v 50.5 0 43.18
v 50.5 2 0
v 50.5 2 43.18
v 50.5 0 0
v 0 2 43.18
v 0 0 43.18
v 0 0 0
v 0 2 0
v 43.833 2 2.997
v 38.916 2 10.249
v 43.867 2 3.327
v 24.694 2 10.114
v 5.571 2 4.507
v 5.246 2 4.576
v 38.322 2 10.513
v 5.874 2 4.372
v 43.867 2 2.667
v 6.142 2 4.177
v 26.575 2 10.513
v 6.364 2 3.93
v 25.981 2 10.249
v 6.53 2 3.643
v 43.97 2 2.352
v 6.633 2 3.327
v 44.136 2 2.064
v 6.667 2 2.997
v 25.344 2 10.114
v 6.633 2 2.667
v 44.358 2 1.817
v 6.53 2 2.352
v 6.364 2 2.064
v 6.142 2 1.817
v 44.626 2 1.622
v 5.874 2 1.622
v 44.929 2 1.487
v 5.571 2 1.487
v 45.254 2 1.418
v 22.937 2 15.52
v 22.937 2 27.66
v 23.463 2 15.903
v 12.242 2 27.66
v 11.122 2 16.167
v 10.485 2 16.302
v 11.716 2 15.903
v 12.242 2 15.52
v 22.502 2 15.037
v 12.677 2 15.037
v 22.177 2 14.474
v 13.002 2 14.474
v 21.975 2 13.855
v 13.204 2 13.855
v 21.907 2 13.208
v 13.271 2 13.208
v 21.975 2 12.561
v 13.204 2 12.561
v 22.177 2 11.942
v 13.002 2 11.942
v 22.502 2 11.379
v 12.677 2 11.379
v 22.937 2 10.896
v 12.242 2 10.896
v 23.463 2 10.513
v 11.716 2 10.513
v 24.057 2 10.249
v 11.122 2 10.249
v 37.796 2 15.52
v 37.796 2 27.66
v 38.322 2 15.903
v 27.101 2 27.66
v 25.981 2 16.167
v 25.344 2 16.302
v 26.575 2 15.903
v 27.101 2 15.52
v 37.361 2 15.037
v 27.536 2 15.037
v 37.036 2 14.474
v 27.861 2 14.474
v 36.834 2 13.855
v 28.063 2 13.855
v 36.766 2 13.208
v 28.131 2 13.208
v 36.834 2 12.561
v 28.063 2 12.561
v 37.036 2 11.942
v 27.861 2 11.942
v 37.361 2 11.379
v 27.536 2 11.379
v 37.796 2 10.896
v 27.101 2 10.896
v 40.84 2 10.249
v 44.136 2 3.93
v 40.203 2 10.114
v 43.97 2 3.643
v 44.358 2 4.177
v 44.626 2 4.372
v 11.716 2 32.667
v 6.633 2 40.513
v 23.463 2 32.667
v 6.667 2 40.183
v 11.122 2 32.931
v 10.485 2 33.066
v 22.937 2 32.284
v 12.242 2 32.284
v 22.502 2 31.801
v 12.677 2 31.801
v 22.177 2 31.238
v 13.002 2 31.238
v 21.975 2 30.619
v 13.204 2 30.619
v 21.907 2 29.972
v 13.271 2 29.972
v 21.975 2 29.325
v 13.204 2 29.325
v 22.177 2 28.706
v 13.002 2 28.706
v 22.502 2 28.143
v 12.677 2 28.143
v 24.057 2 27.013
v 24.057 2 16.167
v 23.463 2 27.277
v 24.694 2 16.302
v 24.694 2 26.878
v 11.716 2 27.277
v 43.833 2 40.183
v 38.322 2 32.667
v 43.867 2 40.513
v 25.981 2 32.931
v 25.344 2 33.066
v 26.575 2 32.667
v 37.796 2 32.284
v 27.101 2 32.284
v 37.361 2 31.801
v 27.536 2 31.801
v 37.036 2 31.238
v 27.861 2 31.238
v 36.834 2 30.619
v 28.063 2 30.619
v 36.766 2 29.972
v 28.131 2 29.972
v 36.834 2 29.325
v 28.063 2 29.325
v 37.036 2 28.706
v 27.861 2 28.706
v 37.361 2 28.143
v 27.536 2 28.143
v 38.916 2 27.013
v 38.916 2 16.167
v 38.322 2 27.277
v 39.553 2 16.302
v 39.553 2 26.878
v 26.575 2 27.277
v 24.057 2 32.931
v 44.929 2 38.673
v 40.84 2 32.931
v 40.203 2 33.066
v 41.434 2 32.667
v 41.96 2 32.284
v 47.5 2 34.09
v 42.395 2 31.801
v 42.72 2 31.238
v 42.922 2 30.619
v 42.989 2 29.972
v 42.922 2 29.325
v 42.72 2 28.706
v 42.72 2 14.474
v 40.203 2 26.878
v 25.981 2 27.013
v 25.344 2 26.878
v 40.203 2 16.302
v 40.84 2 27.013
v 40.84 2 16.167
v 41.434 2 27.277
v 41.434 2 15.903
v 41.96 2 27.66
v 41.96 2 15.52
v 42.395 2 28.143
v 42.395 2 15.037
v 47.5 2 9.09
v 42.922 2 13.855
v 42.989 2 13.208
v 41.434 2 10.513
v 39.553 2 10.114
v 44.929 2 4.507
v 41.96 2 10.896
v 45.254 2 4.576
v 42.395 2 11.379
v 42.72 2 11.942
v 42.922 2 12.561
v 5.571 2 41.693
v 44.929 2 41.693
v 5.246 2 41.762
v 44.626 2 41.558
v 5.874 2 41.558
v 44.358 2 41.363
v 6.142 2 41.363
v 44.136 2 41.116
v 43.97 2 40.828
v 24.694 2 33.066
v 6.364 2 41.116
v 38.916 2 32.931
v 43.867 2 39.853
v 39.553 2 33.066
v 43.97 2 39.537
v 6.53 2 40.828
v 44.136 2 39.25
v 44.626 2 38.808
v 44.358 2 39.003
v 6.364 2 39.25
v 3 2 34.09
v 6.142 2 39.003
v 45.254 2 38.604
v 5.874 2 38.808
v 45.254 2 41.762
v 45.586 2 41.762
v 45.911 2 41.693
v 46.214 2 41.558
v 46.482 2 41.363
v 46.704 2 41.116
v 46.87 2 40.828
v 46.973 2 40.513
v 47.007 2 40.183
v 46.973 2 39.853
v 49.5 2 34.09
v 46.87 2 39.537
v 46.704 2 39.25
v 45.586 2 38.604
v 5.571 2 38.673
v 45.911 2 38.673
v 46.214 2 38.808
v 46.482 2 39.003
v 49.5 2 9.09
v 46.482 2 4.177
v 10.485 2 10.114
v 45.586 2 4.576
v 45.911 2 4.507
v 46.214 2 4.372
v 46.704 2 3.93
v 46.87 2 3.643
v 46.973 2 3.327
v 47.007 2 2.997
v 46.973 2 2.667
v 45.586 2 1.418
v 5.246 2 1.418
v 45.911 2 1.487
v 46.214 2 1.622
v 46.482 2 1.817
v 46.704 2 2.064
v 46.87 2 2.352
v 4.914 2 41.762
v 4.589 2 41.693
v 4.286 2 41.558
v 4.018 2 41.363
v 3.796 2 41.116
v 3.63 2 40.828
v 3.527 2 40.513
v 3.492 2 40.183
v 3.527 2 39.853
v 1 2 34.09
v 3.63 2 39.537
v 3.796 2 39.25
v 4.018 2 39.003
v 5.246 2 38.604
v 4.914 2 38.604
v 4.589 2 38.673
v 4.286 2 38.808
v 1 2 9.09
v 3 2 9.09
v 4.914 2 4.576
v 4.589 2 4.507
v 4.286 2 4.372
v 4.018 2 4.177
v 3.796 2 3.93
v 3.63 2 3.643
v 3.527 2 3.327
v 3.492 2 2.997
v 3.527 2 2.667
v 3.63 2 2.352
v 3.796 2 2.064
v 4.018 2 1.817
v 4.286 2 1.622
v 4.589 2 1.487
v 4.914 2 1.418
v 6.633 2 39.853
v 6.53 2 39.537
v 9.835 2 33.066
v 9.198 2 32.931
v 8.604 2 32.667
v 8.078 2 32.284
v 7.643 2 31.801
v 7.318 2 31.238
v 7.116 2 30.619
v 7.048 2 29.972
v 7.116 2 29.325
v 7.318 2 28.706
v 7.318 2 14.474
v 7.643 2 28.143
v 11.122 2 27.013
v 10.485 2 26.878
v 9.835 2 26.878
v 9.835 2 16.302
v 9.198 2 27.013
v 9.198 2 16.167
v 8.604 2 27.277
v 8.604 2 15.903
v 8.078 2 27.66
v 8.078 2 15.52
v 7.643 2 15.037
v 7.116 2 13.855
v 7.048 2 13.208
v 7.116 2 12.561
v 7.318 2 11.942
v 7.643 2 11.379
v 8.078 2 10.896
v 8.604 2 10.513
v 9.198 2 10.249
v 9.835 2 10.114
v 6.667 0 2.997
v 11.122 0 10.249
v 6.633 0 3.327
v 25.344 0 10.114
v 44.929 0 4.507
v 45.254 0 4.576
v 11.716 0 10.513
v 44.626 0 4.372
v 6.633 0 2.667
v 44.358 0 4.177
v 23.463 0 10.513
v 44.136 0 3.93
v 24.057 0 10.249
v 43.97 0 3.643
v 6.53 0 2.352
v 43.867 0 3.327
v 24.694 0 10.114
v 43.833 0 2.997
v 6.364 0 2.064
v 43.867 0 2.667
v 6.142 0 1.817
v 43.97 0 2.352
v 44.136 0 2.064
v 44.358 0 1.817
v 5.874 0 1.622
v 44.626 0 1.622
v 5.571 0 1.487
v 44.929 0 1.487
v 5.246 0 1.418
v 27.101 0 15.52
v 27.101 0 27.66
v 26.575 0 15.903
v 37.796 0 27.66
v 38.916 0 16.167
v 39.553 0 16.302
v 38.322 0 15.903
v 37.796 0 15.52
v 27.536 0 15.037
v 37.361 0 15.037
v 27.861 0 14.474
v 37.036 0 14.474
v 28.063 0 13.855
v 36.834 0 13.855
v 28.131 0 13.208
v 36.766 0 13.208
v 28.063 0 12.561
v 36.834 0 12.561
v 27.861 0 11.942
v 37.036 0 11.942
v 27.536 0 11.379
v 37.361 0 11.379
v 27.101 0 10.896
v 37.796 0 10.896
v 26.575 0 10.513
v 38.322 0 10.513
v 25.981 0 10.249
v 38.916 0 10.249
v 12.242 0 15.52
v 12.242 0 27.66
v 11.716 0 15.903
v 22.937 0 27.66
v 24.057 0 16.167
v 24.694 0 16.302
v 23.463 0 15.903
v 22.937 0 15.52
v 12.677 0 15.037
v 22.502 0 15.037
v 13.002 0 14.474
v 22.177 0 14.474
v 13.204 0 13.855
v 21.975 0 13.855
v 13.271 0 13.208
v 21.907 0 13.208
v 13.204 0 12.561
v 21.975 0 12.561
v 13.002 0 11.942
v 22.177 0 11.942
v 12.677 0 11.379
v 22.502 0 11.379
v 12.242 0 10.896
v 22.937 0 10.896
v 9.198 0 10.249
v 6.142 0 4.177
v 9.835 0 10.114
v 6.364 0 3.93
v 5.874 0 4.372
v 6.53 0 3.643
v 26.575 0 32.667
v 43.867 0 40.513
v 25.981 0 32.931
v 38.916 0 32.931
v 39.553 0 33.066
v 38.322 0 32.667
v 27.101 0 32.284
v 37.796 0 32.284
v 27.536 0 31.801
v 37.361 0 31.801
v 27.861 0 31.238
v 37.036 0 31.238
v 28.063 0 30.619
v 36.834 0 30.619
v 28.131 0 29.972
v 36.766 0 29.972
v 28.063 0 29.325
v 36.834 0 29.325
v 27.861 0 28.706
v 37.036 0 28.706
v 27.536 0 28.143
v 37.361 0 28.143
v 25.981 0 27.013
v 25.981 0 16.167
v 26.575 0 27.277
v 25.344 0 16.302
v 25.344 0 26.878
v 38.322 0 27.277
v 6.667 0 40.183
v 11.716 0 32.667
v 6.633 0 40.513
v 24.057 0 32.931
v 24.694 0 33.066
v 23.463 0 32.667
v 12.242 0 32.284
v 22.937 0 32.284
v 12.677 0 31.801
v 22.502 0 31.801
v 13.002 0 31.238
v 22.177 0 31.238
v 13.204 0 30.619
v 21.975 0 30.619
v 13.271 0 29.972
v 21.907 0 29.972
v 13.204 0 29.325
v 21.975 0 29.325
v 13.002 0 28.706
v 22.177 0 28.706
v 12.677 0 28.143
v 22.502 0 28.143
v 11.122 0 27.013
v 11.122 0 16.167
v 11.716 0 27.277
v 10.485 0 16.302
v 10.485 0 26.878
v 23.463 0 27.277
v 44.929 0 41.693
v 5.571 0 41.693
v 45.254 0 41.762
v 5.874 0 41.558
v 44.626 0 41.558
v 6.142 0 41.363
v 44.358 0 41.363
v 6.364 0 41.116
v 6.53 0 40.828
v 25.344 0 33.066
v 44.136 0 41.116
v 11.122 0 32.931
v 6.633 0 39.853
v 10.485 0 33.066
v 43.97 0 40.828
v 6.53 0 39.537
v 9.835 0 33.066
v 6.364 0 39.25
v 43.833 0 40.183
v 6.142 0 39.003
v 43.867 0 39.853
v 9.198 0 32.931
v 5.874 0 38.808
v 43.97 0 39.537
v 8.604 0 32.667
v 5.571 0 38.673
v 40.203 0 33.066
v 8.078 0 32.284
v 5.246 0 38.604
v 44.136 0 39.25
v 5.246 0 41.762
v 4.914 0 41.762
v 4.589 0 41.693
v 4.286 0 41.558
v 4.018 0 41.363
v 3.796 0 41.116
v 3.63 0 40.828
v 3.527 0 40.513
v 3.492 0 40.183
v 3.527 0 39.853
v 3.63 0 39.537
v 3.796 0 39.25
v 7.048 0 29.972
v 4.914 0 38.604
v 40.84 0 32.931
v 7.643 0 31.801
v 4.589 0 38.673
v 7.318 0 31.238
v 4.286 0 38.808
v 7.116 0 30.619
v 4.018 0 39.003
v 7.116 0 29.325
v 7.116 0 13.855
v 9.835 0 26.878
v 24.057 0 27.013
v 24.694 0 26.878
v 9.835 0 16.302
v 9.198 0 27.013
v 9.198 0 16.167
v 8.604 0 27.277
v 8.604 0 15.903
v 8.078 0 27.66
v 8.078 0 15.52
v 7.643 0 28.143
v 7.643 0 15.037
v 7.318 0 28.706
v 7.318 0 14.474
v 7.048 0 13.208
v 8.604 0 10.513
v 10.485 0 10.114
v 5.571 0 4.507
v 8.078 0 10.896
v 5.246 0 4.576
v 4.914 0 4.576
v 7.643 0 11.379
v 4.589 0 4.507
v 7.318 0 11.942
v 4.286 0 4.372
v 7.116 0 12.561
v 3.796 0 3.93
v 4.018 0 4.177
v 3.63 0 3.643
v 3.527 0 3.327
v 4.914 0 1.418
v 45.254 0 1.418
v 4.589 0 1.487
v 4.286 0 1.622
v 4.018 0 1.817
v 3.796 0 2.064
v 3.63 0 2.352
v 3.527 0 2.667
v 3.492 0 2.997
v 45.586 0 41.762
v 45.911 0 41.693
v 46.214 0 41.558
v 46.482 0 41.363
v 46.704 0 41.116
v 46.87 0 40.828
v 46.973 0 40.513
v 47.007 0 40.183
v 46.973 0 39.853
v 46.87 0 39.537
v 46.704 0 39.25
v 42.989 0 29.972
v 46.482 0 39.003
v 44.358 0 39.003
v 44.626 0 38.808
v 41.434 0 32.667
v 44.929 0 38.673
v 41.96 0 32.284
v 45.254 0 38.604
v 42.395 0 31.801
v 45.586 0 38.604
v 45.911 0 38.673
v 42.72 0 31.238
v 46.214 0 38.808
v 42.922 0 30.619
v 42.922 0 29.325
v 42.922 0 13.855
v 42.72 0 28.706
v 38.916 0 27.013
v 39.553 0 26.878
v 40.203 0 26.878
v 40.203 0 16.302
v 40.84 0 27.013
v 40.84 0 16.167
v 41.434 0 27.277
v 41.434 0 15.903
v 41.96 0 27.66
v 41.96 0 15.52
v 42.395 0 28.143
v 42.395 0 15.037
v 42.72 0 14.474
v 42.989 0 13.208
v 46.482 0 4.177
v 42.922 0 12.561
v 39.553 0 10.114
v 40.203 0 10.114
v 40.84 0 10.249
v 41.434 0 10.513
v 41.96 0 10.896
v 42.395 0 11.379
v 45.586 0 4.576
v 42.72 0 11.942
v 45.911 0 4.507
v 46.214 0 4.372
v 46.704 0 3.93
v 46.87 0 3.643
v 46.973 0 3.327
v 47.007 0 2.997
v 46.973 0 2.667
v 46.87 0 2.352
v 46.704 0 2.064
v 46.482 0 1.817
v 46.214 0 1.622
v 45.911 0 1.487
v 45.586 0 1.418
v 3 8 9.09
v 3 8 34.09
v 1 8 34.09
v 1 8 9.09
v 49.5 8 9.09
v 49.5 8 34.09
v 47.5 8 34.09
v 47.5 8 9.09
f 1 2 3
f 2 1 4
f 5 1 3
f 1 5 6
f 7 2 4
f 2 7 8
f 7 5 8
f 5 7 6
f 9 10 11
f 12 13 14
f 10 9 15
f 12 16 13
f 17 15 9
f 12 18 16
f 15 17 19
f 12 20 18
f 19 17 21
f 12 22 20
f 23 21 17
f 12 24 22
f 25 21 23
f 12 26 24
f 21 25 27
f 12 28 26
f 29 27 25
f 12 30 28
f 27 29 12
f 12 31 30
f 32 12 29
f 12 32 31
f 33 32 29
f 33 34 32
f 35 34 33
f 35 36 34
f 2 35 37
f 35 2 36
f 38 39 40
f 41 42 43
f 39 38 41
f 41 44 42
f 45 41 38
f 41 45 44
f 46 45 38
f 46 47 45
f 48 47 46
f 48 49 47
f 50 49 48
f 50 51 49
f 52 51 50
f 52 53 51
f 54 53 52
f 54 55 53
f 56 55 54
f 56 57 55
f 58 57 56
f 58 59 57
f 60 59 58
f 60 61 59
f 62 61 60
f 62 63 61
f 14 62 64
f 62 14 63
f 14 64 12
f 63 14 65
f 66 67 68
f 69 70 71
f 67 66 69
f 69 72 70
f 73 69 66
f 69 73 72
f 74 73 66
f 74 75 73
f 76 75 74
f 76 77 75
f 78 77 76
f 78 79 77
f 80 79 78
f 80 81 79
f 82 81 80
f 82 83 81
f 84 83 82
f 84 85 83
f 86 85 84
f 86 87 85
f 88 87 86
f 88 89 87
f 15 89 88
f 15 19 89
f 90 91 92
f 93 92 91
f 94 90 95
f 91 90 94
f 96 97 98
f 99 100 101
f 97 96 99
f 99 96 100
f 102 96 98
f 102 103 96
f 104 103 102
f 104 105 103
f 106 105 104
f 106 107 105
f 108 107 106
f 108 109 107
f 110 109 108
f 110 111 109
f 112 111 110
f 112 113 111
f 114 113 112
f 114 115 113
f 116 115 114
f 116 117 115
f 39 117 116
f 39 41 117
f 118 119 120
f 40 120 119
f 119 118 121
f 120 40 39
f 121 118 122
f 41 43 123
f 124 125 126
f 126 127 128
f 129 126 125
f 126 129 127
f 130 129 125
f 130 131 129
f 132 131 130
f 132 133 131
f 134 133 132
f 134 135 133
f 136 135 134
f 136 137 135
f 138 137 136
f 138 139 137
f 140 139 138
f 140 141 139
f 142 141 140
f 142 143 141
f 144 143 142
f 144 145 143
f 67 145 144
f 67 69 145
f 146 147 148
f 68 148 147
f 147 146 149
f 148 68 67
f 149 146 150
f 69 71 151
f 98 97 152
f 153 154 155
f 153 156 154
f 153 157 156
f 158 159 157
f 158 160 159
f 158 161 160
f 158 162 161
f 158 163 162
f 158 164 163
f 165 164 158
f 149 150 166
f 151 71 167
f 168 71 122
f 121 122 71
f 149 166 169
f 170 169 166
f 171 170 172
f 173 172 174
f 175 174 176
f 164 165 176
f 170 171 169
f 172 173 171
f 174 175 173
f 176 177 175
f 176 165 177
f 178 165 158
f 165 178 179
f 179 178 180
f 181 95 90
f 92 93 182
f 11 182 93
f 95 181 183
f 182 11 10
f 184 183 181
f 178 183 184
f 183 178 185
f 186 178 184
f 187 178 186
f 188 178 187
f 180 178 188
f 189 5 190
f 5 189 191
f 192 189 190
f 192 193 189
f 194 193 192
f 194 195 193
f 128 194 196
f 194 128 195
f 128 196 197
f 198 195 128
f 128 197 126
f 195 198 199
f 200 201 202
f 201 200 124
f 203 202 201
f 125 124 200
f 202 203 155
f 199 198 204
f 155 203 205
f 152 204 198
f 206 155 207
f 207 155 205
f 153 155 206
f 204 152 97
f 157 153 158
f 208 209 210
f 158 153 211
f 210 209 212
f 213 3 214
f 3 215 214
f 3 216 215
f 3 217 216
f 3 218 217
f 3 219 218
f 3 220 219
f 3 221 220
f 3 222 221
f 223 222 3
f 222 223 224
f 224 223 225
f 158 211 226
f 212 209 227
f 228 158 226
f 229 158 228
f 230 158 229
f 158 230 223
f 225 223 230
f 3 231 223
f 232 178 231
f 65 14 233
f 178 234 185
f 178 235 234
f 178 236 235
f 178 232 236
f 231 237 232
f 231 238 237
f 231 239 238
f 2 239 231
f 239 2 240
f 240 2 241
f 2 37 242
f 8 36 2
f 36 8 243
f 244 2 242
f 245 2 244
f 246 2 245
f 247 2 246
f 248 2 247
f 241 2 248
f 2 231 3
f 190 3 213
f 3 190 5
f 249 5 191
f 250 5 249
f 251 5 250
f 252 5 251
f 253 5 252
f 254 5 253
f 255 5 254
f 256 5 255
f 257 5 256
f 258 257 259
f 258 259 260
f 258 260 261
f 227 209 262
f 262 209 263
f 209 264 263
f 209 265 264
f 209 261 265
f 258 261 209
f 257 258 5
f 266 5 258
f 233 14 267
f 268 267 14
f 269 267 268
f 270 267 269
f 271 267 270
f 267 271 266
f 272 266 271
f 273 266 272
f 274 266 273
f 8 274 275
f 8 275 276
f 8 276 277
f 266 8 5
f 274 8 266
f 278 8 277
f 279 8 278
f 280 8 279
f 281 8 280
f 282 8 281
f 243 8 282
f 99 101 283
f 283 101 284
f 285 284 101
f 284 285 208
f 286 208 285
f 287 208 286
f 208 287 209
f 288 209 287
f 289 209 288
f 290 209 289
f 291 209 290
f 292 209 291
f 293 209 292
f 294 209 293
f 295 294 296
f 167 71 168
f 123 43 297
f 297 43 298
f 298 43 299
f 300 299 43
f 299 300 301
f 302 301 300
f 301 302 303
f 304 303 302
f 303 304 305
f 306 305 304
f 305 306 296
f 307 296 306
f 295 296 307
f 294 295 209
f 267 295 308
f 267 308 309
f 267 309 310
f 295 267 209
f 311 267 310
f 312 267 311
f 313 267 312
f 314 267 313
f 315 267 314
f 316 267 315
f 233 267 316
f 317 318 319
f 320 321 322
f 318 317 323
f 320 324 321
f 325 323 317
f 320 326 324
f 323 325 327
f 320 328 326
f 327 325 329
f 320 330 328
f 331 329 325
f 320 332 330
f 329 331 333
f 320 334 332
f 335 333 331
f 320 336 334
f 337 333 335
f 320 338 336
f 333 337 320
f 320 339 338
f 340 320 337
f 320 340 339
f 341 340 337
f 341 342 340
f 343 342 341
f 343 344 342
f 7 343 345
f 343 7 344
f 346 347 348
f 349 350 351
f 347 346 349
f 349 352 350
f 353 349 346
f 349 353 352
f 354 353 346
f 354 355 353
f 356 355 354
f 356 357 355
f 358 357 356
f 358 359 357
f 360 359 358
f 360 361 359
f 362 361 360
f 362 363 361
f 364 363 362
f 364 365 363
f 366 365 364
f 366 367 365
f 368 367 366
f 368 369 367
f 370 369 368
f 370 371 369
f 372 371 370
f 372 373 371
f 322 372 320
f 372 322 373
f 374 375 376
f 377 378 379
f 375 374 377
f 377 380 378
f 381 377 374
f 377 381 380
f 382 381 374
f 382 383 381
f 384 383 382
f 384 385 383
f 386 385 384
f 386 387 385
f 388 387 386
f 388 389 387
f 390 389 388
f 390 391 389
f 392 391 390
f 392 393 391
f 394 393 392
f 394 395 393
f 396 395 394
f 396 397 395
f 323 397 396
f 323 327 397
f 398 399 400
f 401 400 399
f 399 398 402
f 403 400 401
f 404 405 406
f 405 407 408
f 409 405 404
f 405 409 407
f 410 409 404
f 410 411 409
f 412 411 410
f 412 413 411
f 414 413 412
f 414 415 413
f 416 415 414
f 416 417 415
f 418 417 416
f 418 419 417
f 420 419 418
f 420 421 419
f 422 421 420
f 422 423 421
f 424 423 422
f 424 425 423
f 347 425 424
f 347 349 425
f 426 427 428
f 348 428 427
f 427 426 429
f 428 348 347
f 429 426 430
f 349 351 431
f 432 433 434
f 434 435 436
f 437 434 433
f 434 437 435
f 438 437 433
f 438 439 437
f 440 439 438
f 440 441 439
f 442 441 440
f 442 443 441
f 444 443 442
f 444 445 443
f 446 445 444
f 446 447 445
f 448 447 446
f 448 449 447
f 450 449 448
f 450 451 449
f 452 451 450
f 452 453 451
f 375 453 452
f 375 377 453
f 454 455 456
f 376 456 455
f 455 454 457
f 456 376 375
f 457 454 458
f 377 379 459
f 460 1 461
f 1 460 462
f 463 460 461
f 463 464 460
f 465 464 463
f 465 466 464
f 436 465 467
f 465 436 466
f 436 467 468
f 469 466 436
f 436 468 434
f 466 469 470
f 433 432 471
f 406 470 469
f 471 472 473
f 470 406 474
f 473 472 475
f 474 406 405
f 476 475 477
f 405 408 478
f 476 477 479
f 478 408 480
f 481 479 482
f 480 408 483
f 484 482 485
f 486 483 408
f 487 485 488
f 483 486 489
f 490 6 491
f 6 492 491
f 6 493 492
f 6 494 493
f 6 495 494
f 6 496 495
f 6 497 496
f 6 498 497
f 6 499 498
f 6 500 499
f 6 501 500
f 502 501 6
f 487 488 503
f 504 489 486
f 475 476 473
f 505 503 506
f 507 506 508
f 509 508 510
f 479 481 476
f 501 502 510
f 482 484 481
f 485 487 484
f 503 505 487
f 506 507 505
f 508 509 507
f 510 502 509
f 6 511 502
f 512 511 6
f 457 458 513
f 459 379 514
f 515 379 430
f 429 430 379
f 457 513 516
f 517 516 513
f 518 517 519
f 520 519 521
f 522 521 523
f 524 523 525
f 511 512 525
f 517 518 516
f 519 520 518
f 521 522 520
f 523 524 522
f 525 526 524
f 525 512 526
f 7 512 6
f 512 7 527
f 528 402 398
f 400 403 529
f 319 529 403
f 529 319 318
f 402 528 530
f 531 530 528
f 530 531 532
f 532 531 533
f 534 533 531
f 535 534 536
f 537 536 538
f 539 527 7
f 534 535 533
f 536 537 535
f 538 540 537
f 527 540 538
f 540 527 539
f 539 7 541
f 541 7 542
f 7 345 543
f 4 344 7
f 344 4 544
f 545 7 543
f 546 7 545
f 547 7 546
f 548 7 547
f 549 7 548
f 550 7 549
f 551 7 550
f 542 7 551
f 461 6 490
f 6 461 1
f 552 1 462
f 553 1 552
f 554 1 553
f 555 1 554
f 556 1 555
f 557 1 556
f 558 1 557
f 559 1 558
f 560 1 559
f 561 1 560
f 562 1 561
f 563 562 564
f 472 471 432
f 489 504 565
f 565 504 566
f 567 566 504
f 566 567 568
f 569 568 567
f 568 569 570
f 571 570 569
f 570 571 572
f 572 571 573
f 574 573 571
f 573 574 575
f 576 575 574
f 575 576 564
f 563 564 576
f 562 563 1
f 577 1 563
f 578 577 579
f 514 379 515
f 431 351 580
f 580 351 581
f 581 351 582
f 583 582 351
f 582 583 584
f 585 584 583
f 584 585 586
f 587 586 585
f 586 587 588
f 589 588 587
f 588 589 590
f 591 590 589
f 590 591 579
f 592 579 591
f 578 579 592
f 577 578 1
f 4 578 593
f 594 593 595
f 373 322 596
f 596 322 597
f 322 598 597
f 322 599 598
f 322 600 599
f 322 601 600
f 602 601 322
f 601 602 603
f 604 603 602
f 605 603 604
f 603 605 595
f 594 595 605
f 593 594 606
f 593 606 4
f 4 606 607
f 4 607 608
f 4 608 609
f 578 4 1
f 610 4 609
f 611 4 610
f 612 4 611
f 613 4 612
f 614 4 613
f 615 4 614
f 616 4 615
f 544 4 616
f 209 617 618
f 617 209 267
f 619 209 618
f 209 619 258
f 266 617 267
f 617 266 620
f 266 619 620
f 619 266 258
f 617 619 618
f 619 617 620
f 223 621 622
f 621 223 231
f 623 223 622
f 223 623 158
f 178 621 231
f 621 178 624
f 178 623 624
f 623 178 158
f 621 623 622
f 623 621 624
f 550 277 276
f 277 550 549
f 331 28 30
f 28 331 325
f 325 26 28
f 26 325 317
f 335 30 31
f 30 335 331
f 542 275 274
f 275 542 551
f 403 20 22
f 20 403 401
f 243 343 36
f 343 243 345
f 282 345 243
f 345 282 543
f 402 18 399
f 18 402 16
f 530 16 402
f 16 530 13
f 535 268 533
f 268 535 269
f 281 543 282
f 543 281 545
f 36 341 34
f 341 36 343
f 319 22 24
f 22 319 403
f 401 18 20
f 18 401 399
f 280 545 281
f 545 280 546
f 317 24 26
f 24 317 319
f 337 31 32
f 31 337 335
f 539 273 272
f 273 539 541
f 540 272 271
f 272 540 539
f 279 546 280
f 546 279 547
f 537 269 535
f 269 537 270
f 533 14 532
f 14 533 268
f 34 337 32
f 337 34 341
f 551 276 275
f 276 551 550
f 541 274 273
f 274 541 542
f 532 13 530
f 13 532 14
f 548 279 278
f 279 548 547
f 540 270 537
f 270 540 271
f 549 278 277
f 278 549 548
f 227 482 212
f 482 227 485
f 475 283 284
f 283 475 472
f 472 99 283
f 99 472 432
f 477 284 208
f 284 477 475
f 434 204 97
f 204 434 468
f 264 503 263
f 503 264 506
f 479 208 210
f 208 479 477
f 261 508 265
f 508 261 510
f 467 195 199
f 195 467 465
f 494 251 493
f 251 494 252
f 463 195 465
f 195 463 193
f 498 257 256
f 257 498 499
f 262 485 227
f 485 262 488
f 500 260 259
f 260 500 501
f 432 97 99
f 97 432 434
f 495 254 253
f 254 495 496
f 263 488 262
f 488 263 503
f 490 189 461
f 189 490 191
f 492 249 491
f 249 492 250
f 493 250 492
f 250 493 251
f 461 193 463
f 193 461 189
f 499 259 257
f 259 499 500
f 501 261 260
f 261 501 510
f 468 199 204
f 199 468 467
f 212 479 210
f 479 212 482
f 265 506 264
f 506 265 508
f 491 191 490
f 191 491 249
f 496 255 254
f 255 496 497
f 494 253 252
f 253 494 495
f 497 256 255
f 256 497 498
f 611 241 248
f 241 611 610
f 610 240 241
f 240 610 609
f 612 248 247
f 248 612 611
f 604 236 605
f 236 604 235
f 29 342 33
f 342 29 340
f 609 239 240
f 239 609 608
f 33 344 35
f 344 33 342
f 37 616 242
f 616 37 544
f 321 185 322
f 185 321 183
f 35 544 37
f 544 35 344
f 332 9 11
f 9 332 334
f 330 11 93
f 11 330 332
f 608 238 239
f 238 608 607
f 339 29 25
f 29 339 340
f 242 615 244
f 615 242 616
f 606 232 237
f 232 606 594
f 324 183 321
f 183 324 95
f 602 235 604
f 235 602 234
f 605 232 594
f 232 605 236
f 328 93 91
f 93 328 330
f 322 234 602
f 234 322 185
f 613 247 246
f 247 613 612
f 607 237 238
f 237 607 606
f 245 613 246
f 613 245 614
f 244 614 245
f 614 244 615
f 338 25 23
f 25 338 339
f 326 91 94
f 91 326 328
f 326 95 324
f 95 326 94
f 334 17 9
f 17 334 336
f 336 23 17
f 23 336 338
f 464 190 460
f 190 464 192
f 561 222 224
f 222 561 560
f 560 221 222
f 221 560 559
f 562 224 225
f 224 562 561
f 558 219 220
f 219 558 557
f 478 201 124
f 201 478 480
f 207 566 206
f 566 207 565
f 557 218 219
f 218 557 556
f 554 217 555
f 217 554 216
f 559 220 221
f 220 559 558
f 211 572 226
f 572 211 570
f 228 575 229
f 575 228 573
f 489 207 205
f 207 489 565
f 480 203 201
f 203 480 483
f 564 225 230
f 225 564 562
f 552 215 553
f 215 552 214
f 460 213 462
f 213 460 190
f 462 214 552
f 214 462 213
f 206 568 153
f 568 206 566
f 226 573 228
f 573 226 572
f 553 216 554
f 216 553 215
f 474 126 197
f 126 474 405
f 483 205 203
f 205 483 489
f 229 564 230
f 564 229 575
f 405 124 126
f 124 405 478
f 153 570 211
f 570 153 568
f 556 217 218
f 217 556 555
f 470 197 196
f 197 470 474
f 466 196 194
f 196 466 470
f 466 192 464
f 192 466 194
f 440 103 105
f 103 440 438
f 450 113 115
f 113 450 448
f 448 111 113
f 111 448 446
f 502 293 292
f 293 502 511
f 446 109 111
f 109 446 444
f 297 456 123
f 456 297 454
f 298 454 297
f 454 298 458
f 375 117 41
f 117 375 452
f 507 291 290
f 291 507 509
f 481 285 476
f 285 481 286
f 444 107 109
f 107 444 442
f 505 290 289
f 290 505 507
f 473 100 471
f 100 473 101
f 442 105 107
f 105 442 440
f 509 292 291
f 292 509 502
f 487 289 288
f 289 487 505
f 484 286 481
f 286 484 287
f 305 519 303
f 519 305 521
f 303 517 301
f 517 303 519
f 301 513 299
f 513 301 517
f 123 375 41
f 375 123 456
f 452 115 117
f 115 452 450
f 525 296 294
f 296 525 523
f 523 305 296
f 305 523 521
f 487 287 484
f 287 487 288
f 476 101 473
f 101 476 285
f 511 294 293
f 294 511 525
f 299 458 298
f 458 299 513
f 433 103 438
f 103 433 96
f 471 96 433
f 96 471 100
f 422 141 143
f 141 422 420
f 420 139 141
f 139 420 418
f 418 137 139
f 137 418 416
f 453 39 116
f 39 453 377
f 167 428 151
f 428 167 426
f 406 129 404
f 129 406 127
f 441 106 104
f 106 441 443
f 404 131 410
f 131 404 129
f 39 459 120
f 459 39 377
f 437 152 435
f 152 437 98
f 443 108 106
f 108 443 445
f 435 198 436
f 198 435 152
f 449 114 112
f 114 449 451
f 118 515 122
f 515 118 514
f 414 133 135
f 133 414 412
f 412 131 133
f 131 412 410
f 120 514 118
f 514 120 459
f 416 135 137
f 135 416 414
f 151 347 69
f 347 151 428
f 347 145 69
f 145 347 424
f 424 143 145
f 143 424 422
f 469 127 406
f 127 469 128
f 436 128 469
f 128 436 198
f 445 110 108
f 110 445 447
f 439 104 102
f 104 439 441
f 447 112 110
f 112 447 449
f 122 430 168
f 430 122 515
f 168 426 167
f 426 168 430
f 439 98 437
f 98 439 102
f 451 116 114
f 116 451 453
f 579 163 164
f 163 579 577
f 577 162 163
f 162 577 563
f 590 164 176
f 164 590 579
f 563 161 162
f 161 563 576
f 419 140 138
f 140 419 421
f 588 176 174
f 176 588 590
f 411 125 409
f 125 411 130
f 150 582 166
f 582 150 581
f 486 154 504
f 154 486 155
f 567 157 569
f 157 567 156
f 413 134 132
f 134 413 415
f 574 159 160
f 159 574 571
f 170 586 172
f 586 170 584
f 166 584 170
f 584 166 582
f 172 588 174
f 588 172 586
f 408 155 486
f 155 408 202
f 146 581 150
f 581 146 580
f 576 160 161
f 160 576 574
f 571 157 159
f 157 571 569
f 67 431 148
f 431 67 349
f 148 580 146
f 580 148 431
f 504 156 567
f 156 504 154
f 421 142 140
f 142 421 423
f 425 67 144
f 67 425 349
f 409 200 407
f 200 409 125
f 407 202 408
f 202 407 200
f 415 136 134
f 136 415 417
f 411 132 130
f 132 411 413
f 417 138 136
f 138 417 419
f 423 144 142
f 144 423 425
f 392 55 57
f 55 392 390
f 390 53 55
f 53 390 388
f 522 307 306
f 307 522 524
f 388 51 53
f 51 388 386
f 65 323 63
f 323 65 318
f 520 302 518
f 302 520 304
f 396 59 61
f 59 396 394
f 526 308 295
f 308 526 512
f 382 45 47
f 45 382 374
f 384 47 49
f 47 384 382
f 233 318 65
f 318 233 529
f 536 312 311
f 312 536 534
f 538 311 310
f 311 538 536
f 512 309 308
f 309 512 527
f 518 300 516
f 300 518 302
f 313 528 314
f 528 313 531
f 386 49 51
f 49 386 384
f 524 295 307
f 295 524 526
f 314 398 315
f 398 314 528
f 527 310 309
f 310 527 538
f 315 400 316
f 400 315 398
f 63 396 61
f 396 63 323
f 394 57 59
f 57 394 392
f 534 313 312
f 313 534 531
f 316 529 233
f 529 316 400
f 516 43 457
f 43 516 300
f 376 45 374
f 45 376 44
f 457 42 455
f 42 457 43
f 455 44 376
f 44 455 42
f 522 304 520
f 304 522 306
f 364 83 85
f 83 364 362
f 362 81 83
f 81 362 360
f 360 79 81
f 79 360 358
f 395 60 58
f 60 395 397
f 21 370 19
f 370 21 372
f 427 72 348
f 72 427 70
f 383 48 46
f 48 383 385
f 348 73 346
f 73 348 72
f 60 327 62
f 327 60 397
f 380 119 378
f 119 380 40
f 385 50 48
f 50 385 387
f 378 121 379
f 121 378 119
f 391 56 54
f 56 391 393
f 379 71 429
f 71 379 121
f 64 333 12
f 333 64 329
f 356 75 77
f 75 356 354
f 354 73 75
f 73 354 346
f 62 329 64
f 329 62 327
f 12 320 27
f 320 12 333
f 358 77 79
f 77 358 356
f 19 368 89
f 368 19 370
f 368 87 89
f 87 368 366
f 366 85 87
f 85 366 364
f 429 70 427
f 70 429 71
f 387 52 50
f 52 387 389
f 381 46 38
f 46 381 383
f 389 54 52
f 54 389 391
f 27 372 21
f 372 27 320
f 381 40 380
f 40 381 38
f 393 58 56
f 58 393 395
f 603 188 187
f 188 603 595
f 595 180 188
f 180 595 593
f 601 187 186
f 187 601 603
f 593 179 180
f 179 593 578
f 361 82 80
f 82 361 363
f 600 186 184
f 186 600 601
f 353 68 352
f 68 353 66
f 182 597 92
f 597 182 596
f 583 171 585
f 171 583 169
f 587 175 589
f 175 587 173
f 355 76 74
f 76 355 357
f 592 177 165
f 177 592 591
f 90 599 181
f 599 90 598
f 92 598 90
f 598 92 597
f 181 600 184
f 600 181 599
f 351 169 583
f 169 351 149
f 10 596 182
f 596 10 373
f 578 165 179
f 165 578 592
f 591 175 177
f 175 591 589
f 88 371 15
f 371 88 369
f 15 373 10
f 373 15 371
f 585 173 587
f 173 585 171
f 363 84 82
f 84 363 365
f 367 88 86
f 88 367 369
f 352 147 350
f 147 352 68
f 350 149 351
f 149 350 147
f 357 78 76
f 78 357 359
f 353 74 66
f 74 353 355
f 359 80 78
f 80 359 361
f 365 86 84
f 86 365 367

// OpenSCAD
// file: tile_common.scad
/*
Common modules and functions for 1U Tiles
*/

function inches( x) = x * 25.4; // convert inches to mm

// put a hole in the tile of diameter 'd' at position 'x','z'
module hole( x, z, d) {
    translate([x, 0, z])
        rotate([270,0,0])
            cylinder(r=(d / 2), h=10, center=true);
}
// file: blank_tile.scad
/*
A Pulp Logic compatible 1U blank tile.

based on the dimensions given here:
http://pulplogic.com/1u_tiles/

units: millimeters
*/

use <tile_common.scad>;

plate_height = inches(1.7); // spec is 1.7"

module front_face(plate_width) {
    thickness = 2; // thickness of PCB front panels
    cube([plate_width, thickness, plate_height], center=false);
}

rib_width = 2;
rib_inset = 1;
rib_height = 25; // max physically measured at 29.06
rib_depth = 8;
module left_stiffening_rib() {
    translate([rib_inset, 0, ((plate_height - rib_height) / 2)]){
        cube([rib_width, rib_depth, rib_height], center=false);
    }
}

module right_stiffening_rib(plate_width) {
    translate([((plate_width - rib_width) - rib_inset), 0, ((plate_height - rib_height) / 2)]){
        cube([rib_width, rib_depth, rib_height], center=false);
    }
}

module material(plate_width) {
    union() {
        front_face(plate_width);
        left_stiffening_rib();
        right_stiffening_rib(plate_width);
    }
}

module mounting_holes(plate_width) {
    // make round shapes more fine
    $fs = 0.1;

    mounting_hole_dia = inches(0.125); // spec 0.125"
    hole_horiz_offset = inches(0.200); // spec 0.200"
    hole_vert_offset = inches(0.118); // spec 0.118"

    module hole_pair(h_offset) {
        hole(x=h_offset, z=hole_vert_offset, d=mounting_hole_dia);
        
        hole(x=h_offset, z=(plate_height - hole_vert_offset), d=mounting_hole_dia);
    }
    hole_pair(hole_horiz_offset);
    hole_pair(plate_width - hole_horiz_offset);
}

module cutouts(plate_width) {
    mounting_holes(plate_width);
}

// hp is the width in eurorack 'hole positions'
module blank_tile(hp = 6) {
    plate_width = hp * 5.08 - 0.3; // general conversion factor with fudge for tolerance
    difference() {
        material(plate_width);
        cutouts(plate_width);
    }
}

blank_tile();
// main file
/*
A Pulp Logic compatible 1U with cutouts to mount six jacks.

modified version of 'four_jacks.scad'

units: millimeters
*/

use <blank_tile.scad>
use <tile_common.scad>

module cutouts() {
    $fs=0.01; // make cylinder curves more fine
    // Rows
    top = inches(1.180);
    bottom = inches(0.520);
    // Columns
    col_spacing = 0.585;
    left = inches(0.4);
    center = left + inches(col_spacing);
    right = left + 2 * inches(col_spacing);

    // top-left jack
    hole(x=left, z=top, d=inches(0.245));

    // top-center jack
    hole(x=center, z=top, d=inches(0.245));

    // top-right jack
    hole(x=right, z=top, d=inches(0.245));

    // bottom-left jack
    hole(x=left, z=bottom, d=inches(0.245));

    // bottom-center jack
    hole(x=center, z=bottom, d=inches(0.245));

    // bottom-right jack
    hole(x=right, z=bottom, d=inches(0.245));
}

module six_jacks() {
    difference() {
        blank_tile(10);
        cutouts();
    }
}

six_jacks();
